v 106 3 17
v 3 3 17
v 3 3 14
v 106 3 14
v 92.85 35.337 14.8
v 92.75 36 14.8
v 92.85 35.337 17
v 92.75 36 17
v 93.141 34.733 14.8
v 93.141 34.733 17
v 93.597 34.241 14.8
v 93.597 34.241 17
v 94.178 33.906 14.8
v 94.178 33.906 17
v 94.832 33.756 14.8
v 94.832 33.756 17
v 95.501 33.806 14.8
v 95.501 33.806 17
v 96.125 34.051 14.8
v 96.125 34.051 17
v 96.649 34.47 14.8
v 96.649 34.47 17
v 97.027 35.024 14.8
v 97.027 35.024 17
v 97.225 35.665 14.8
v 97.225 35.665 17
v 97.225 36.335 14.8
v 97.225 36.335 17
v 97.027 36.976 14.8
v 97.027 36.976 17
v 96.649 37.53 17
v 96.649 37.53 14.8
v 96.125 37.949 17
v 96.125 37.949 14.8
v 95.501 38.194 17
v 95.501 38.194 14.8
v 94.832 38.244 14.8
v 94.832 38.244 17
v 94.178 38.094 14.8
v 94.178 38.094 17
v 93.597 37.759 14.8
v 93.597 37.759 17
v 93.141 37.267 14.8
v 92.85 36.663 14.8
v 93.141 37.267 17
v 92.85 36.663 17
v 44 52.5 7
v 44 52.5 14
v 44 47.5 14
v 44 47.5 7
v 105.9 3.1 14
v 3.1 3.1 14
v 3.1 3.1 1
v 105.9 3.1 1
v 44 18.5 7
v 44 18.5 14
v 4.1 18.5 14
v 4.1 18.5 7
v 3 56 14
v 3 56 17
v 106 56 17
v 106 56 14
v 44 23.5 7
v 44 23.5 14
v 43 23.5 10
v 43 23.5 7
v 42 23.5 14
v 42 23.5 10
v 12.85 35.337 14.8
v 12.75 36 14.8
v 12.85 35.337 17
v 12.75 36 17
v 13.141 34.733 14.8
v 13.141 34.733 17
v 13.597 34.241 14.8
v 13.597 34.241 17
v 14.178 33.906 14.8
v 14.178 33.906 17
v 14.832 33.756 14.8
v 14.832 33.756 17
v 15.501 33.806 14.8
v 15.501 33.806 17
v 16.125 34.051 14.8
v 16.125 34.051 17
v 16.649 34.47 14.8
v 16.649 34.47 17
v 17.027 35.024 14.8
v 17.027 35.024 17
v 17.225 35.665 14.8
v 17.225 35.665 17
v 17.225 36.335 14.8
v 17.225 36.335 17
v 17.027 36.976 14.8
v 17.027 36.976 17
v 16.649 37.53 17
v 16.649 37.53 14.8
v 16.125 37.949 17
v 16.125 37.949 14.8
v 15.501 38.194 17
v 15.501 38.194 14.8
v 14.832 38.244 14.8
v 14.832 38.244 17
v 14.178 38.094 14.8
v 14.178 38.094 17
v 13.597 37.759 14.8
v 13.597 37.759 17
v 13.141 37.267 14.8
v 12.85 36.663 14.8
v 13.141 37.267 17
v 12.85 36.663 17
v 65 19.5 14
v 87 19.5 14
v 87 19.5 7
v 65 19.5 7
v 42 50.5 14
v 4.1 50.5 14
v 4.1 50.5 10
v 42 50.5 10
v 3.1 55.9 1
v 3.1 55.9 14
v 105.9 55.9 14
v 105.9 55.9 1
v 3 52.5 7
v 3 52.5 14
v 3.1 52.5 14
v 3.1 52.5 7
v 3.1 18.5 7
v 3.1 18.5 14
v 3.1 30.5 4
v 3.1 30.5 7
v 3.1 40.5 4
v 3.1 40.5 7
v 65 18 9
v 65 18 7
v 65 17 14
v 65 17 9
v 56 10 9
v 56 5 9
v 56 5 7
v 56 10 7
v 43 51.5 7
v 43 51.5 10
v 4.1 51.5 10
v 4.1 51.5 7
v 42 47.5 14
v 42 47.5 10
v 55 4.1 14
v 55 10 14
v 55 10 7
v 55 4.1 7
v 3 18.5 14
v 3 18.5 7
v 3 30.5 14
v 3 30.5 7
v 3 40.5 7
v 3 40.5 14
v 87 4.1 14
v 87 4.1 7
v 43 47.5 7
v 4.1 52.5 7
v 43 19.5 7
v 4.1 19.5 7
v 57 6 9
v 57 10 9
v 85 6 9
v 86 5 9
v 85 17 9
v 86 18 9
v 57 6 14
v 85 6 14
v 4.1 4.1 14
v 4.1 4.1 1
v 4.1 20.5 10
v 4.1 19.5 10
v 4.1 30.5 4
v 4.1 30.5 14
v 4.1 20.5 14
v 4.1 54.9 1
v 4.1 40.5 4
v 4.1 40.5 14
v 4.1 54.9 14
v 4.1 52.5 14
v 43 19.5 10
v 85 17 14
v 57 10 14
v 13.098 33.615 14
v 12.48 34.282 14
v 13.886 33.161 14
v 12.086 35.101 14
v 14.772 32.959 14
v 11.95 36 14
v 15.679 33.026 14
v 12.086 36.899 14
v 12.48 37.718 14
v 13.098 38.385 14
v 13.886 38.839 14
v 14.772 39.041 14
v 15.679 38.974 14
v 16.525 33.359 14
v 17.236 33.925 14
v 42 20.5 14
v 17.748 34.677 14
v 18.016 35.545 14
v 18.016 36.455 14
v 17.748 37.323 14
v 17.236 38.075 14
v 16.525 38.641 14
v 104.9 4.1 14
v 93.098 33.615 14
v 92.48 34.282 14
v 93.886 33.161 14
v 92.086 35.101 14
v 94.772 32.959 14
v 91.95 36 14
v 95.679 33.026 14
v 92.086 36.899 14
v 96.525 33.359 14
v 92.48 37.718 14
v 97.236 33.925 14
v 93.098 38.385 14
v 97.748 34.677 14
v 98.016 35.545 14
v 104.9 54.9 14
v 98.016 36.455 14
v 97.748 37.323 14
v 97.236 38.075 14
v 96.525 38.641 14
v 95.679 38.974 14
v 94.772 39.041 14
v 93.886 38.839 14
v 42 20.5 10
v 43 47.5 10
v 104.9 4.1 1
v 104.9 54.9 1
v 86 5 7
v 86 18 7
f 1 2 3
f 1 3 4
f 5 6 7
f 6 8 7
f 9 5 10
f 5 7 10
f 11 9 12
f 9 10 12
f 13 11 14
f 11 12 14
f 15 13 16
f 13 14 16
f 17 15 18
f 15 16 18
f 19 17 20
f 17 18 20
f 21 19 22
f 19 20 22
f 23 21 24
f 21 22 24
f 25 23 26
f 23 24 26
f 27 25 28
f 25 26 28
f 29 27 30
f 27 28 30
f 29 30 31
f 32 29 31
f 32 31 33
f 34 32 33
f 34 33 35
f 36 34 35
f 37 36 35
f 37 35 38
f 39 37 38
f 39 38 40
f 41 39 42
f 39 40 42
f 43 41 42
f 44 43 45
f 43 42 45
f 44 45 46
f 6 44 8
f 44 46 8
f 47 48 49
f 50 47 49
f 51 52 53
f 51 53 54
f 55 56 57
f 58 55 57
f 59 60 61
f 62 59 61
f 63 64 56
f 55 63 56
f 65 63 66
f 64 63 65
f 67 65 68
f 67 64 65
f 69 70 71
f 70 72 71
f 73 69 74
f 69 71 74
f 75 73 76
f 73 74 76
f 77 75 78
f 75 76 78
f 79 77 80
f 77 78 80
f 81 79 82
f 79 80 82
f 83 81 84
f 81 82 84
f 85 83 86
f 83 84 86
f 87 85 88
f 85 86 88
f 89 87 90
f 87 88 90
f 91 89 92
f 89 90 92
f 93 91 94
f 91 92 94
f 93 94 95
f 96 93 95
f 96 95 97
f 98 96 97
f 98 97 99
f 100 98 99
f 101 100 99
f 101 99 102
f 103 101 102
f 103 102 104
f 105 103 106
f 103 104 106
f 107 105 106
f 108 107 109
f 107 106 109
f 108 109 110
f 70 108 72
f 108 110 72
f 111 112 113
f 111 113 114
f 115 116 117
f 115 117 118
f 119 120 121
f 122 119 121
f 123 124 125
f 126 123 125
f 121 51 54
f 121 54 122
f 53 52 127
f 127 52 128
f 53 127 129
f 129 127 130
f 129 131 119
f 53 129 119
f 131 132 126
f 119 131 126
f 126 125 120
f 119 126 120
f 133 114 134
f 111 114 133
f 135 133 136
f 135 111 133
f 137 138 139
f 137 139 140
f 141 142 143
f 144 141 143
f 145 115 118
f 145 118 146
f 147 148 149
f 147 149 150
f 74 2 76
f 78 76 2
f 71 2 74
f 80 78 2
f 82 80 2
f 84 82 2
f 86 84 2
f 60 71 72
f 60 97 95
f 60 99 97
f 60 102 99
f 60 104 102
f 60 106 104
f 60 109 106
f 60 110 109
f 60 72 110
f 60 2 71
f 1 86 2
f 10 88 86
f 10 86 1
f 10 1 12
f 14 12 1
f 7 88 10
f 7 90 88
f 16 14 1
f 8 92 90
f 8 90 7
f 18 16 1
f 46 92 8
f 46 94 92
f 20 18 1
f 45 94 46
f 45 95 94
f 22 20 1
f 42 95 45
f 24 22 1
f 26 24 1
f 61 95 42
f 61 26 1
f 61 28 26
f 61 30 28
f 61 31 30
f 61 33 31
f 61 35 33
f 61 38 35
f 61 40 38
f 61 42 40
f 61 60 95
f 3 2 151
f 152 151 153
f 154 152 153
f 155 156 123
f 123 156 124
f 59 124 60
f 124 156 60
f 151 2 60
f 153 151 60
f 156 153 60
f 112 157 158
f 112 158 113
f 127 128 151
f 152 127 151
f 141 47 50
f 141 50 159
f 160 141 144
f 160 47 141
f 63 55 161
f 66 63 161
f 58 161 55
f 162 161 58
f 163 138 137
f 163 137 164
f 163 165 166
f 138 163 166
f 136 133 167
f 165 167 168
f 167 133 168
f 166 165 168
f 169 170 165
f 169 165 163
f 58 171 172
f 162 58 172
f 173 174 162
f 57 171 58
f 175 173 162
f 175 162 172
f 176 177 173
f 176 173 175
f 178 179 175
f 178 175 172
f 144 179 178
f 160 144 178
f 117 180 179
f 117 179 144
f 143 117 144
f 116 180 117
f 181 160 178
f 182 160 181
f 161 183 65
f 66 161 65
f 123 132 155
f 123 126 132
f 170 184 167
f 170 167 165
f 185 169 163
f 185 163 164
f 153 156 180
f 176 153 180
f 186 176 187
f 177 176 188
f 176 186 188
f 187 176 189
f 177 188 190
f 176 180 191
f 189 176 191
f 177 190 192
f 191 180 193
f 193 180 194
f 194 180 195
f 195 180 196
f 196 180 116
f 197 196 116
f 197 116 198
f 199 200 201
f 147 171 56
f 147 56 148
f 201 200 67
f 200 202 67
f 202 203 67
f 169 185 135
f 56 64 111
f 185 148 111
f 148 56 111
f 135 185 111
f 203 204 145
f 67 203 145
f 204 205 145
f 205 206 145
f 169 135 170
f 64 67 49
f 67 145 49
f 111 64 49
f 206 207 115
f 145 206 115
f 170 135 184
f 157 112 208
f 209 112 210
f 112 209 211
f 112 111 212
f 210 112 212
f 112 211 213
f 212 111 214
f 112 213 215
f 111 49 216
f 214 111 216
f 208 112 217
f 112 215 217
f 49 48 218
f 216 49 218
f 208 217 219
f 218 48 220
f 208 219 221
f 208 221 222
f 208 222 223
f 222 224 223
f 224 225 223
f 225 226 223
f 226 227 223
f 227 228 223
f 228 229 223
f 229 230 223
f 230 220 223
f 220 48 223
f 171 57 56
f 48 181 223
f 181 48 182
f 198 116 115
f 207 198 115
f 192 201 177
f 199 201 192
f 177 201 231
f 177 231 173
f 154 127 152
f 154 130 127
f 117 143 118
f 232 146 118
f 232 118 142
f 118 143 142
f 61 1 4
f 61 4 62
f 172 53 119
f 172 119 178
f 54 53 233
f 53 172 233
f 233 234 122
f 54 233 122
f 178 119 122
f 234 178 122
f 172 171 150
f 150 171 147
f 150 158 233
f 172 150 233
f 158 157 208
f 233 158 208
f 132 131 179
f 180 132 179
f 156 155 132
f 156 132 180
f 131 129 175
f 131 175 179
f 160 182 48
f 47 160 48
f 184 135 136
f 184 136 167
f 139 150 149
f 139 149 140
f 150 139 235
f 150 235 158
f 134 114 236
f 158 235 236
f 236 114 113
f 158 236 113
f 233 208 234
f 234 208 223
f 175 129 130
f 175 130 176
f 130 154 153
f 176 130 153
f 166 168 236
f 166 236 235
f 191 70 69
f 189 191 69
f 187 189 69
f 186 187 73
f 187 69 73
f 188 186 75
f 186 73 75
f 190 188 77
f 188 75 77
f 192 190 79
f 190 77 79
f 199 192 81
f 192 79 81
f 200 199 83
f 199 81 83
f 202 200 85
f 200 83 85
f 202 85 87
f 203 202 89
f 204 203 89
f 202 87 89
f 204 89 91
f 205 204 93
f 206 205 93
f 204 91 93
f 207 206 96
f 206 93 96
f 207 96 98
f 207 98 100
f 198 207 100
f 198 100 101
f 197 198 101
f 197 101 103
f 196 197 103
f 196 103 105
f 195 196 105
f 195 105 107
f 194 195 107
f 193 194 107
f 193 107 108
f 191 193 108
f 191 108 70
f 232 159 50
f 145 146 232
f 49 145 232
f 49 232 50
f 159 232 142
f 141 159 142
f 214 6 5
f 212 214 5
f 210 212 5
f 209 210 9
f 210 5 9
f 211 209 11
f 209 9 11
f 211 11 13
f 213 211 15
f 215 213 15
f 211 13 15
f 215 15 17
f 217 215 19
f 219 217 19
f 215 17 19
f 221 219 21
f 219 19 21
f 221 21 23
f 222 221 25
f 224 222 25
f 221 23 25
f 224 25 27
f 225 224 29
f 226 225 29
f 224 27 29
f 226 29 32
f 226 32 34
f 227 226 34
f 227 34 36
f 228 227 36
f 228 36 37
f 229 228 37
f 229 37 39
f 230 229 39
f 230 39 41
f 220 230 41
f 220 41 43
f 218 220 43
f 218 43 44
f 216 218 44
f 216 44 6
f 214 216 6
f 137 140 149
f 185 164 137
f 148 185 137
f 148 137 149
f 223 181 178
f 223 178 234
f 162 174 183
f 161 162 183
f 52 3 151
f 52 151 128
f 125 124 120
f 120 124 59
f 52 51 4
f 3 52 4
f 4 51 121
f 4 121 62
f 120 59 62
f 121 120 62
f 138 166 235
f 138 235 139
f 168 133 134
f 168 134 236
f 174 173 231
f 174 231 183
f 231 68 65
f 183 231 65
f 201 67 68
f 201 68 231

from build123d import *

# Parameters (mm, degrees)
SKETCH068_W         = 103
SKETCH068_H         = 53
PAD046_DEPTH        = 3
HOLE004_D           = 4.5
HOLE004_DEPTH       = 25
HOLE004_CSINK_D     = 6.1
HOLE004_CSINK_ANGLE = 90
PAD047_DEPTH        = 7
SKETCH071_W         = 102.8
SKETCH071_H         = 52.8
SKETCH071_W_2       = 100.8
SKETCH071_H_2       = 50.8
PAD048_DEPTH        = 13
PAD049_DEPTH        = 7
PAD050_DEPTH        = 5
PAD051_DEPTH        = 4
SKETCH076_W         = 10
SKETCH076_H         = 10
POCKET015_DEPTH     = 5


with BuildPart() as part:
    # Sketch068 → Pad046 (new body)
    with BuildSketch(Plane.XY):
        with Locations((51.5, 26.5)):
            Rectangle(SKETCH068_W, SKETCH068_H)
    extrude(amount=-PAD046_DEPTH)

    # Hole004
    with Locations(Plane(origin=(0, 0, -3), x_dir=(1, 0, 0), z_dir=(0, 0, -1))):
        with Locations((12, -33), (92, -33)):
            CounterSinkHole(HOLE004_D / 2, HOLE004_CSINK_D / 2, depth=HOLE004_DEPTH, counter_sink_angle=HOLE004_CSINK_ANGLE)

    # Sketch070 → Pad047 (join)
    with BuildSketch(Plane.XY.offset(-3)):
        Polygon((0, 49.5), (41, 49.5), (41, 44.5), (40, 44.5), (40, 48.5), (1, 48.5), (1, 16.5), (40, 16.5), (40, 20.5), (41, 20.5), (41, 15.5), (0, 15.5), align=None)
    extrude(amount=-PAD047_DEPTH)

    # Sketch071 → Pad048 (join)
    with BuildSketch(Plane.XY.offset(-3)):
        with Locations((51.5, 26.5)):
            Rectangle(SKETCH071_W, SKETCH071_H)
        with Locations((51.5, 26.5)):
            Rectangle(SKETCH071_W_2, SKETCH071_H_2, mode=Mode.SUBTRACT)
    extrude(amount=-PAD048_DEPTH)

    # Sketch073 → Pad049 (join)
    with BuildSketch(Plane.XY.offset(-3)):
        Polygon((52, 1), (84, 1), (84, 16.5), (62, 16.5), (62, 15), (83, 15), (83, 2), (53, 2), (53, 7), (52, 7), align=None)
    extrude(amount=-PAD049_DEPTH)

    # Sketch074 → Pad050 (join)
    with BuildSketch(Plane.XY.offset(-3)):
        Polygon((53, 7), (53, 2), (83, 2), (83, 15), (62, 15), (62, 14), (82, 14), (82, 3), (54, 3), (54, 7), align=None)
    extrude(amount=-PAD050_DEPTH)

    # Sketch075 → Pad051 (join)
    with BuildSketch(Plane.XY.offset(-3)):
        Polygon((40, 20.5), (39, 20.5), (39, 17.5), (1.1, 17.5), (1.1, 16.5), (40, 16.5), align=None)
        Polygon((40, 44.5), (40, 48.5), (1.1, 48.5), (1.1, 47.5), (39, 47.5), (39, 44.5), align=None)
    extrude(amount=-PAD051_DEPTH)

    # Sketch076 → Pocket015 (cut)
    with BuildSketch(Plane.YZ):
        with Locations((32.5, -8)):
            Rectangle(SKETCH076_W, SKETCH076_H)
    extrude(amount=POCKET015_DEPTH, mode=Mode.SUBTRACT)


with BuildPart() as part_1:
    # Body020 placement: moved
    add(part.part.moved(Location((3, 3, 17))))


solid = part_1.part
